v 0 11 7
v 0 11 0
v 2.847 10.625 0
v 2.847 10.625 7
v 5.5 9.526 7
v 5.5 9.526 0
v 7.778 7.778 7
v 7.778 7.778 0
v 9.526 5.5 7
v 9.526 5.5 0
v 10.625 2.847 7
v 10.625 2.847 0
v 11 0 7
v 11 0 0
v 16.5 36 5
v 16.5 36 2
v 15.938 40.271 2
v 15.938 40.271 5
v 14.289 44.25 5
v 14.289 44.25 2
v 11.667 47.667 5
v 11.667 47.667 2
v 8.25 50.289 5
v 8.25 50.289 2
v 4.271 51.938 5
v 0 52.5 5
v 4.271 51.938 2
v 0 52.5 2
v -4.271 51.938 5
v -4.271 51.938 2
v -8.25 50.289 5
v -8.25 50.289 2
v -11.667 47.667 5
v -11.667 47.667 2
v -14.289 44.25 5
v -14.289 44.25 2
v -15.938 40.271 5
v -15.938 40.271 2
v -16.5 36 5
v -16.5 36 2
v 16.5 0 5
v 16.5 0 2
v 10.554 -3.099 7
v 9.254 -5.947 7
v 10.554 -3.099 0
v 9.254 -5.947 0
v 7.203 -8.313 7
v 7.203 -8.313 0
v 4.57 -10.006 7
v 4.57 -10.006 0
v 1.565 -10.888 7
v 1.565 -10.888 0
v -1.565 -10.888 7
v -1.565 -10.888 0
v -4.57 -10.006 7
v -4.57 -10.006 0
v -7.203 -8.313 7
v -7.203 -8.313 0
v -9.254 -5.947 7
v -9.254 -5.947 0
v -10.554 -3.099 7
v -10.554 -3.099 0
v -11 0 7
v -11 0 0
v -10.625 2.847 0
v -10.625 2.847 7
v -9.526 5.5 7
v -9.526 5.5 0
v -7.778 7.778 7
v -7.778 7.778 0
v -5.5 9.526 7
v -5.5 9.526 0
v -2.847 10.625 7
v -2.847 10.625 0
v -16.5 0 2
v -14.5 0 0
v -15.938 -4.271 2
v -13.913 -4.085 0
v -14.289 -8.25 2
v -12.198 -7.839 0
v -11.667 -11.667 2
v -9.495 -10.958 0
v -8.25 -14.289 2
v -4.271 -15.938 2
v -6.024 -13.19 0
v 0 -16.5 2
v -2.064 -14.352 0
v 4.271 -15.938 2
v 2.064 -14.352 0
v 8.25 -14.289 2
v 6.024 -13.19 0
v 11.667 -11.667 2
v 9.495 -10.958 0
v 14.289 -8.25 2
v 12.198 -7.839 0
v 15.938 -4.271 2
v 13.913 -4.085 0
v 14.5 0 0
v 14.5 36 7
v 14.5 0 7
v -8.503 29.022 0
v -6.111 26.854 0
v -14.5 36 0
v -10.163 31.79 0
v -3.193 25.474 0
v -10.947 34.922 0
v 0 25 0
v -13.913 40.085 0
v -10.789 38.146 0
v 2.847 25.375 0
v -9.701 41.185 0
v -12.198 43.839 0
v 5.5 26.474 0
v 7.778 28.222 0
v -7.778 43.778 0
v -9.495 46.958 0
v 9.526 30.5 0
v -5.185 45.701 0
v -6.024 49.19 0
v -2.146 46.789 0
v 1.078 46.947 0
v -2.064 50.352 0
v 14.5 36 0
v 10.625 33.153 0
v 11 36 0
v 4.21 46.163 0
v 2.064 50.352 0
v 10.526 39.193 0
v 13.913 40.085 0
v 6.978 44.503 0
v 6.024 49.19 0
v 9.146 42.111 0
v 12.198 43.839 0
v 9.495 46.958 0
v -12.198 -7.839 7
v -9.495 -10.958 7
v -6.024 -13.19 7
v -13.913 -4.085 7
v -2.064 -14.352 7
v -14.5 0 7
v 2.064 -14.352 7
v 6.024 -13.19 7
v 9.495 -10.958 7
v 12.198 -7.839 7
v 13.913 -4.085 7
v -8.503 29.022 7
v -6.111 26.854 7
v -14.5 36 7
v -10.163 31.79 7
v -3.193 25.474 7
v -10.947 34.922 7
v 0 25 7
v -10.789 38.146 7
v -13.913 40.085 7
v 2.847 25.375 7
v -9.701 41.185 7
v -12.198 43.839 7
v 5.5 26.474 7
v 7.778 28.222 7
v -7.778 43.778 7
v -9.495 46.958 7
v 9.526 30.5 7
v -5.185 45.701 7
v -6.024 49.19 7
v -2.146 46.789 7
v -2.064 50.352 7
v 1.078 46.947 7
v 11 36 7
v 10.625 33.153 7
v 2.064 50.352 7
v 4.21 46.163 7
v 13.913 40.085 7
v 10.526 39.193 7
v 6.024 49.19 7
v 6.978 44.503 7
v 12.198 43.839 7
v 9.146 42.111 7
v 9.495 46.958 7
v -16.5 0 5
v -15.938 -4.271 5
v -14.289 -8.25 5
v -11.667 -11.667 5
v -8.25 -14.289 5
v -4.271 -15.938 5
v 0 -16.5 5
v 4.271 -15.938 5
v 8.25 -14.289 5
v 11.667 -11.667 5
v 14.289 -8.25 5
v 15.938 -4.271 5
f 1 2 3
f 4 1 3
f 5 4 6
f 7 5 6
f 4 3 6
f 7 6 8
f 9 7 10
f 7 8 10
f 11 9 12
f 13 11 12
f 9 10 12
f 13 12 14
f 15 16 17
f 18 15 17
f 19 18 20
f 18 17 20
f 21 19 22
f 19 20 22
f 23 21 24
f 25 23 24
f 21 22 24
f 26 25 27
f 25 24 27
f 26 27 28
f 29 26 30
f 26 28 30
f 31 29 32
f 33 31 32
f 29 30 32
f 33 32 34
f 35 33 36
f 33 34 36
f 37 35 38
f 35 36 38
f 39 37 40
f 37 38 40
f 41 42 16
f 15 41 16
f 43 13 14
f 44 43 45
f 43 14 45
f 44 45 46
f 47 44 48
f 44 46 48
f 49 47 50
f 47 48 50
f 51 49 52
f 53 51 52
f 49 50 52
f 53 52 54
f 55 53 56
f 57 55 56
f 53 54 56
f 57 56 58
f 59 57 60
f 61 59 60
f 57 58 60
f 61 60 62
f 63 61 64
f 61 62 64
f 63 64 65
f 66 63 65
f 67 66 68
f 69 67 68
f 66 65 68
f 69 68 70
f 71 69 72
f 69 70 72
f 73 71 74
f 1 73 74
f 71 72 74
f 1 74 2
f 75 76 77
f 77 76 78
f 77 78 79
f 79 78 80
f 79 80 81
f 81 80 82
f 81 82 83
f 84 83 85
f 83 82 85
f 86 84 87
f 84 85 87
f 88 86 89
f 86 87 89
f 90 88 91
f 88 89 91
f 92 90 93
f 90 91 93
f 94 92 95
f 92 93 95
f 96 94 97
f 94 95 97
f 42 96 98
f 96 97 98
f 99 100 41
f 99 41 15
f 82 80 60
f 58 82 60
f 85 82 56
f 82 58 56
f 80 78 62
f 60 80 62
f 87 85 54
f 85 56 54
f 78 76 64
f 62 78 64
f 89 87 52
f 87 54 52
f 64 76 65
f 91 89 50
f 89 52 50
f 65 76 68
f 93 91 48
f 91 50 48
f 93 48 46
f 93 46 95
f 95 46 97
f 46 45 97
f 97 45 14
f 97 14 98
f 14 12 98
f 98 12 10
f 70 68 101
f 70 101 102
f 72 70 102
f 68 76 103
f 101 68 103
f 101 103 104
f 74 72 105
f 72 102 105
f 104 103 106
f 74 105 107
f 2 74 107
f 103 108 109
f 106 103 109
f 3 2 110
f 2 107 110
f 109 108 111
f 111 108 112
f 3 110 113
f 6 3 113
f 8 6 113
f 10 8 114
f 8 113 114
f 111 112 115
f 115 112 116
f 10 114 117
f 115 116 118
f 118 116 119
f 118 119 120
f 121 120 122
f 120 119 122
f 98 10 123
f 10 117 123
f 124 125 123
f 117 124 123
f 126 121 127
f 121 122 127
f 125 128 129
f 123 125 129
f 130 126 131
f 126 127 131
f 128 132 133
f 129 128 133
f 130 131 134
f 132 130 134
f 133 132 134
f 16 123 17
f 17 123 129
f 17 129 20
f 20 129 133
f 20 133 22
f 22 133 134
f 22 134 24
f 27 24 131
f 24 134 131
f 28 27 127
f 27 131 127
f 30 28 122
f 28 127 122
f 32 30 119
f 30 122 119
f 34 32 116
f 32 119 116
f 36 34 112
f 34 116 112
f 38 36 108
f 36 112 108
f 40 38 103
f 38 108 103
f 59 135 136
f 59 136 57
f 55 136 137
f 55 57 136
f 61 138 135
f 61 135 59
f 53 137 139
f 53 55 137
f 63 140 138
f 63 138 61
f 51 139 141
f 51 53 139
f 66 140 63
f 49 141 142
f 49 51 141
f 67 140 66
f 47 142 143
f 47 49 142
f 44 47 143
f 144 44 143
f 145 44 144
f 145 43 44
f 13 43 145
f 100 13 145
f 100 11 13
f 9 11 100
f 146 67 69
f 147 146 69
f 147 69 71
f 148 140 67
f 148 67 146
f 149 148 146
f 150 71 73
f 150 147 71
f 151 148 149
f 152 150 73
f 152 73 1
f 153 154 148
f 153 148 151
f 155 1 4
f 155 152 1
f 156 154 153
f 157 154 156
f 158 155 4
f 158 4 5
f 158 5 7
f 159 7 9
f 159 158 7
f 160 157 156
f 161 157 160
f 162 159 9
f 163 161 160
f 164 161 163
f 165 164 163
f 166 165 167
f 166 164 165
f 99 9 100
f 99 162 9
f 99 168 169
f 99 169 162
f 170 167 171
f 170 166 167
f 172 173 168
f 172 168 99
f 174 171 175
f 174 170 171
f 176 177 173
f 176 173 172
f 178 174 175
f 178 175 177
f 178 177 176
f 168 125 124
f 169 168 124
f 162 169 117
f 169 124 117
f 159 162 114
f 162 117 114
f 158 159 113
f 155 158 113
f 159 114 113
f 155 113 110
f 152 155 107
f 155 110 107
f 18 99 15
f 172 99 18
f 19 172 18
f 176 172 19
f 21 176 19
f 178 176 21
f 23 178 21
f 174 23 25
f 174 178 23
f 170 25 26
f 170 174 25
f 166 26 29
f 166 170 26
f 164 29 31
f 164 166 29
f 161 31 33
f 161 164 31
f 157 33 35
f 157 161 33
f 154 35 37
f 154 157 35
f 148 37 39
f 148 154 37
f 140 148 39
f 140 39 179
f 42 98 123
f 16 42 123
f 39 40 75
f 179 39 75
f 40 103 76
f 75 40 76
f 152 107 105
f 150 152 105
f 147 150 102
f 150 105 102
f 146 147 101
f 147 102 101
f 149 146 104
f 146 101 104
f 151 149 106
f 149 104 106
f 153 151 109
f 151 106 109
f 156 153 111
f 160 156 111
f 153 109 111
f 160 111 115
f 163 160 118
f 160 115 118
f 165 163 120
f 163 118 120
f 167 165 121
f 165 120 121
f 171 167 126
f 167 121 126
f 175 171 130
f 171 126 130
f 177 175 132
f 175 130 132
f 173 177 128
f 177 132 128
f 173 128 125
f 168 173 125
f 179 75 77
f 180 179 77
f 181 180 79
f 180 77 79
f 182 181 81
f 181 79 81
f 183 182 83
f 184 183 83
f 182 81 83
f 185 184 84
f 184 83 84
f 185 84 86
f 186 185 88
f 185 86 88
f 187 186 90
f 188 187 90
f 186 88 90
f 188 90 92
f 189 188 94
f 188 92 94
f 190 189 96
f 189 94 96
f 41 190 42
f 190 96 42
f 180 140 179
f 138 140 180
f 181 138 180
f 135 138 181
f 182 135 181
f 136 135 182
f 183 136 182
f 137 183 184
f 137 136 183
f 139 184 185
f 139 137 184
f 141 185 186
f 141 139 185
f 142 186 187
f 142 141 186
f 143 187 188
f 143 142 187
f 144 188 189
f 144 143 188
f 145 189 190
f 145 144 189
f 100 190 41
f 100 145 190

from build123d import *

# Parameters (mm, degrees)
F1_DEPTH = 7
F2_SIZE  = 2


with BuildPart() as f1:
    # F0 (on Top) → F1 (new body)
    with BuildSketch(Plane.XY):
        with BuildLine():
            Line((16.5, 0), (11, 0))
            ThreePointArc((11, 0), (0, -11), (-11, 0))
            Line((-11, 0), (-16.5, 0))
            ThreePointArc((-16.5, 0), (0, -16.5), (16.5, 0))
        make_face()
        with BuildLine():
            ThreePointArc((0, 11), (7.7781745931, 7.7781745931), (11, 0))
            Line((11, 0), (16.5, 0))
            ThreePointArc((16.5, 0), (11.6672618896, 11.6672618896), (0, 16.5))
            Line((0, 16.5), (0, 11))
        make_face()
        with BuildLine():
            ThreePointArc((-11, 0), (-7.7781745931, 7.7781745931), (0, 11))
            Line((0, 11), (0, 16.5))
            ThreePointArc((0, 16.5), (-11.6672618896, 11.6672618896), (-16.5, 0))
            Line((-16.5, 0), (-11, 0))
        make_face()
        with BuildLine():
            ThreePointArc((0, 16.5), (11.6672618896, 11.6672618896), (16.5, 0))
            Line((16.5, 0), (16.5, 36))
            ThreePointArc((16.5, 36), (11.6672618896, 24.3327381104), (0, 19.5))
            Line((0, 19.5), (0, 16.5))
        make_face()
        with BuildLine():
            ThreePointArc((-16.5, 0), (-11.6672618896, 11.6672618896), (0, 16.5))
            Line((0, 16.5), (0, 19.5))
            ThreePointArc((0, 19.5), (-11.6672618896, 24.3327381104), (-16.5, 36))
            Line((-16.5, 36), (-16.5, 0))
        make_face()
        with BuildLine():
            ThreePointArc((0, 19.5), (11.6672618896, 24.3327381104), (16.5, 36))
            ThreePointArc((16.5, 36), (0, 52.5), (-16.5, 36))
            ThreePointArc((-16.5, 36), (-11.6672618896, 24.3327381104), (0, 19.5))
        make_face()
        with BuildLine():
            ThreePointArc((11, 36), (7.7781745931, 28.2218254069), (0, 25))
            ThreePointArc((0, 25), (-7.7781745931, 43.7781745931), (11, 36))
        make_face(mode=Mode.SUBTRACT)
    extrude(amount=F1_DEPTH)

    # F2
    f2_edges = [f1.edges().sort_by_distance(p)[0] for p in [
        (16.5, 18, 0),
        (16.5, 18, 7),
    ]]
    chamfer(f2_edges, length=F2_SIZE)


solid = f1.part
